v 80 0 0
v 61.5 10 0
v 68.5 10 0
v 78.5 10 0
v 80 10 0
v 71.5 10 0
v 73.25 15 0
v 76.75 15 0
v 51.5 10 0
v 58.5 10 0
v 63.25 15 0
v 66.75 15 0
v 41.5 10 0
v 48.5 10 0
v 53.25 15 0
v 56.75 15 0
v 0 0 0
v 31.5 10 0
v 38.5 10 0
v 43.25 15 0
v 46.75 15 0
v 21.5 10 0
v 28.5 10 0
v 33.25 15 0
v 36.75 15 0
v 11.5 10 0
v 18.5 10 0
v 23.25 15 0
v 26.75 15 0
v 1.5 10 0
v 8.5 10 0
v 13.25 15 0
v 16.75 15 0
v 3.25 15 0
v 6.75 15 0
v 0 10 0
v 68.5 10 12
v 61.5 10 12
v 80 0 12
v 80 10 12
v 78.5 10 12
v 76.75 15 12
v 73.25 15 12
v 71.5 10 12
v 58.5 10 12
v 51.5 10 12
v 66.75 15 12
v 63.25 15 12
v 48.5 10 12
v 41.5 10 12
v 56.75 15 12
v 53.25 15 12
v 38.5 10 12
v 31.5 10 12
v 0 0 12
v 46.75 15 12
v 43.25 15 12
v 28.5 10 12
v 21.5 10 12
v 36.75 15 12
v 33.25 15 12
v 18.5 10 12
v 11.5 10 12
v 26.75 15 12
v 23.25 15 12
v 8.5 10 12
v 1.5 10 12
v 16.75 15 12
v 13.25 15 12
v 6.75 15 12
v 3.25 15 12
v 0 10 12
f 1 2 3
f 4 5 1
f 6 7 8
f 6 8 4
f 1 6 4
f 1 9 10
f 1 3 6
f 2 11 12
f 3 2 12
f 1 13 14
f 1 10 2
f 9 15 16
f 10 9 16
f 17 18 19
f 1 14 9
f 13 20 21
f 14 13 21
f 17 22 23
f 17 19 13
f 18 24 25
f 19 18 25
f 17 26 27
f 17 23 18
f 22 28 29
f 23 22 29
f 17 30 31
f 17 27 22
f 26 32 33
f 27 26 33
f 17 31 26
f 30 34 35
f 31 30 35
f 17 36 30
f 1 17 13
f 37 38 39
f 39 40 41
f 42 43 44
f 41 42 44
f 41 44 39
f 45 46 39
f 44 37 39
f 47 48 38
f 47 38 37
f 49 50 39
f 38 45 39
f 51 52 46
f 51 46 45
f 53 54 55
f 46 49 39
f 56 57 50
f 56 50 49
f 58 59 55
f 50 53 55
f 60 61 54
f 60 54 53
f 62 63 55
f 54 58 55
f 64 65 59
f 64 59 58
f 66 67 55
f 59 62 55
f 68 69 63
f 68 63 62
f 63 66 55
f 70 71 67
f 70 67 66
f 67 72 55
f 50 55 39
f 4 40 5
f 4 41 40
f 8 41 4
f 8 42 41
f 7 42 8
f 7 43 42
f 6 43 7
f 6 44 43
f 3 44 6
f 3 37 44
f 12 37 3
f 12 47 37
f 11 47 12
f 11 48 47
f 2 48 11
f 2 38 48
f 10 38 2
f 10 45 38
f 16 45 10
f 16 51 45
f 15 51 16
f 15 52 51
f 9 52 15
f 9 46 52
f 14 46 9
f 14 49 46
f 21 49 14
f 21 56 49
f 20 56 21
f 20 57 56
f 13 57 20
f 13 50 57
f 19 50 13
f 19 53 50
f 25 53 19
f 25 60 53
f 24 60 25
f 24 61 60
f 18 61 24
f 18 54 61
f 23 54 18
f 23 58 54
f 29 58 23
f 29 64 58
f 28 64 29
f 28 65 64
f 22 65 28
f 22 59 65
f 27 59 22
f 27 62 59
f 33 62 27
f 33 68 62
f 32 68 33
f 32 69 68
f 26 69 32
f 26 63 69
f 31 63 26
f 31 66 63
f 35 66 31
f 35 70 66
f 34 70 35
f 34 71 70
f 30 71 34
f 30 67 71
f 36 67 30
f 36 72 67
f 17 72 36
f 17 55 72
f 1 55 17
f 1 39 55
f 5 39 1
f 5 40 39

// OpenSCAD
$fn = 32;

// ----------------------------------------------------------------------
// Gear rack: 8 teeth, pitch 10 mm
// ----------------------------------------------------------------------

// --- parameters (mm) ---
teeth = 8;                // number of teeth
pitch = 10;               // tooth pitch, X
root_w = 7;               // tooth width at the root
tip_w = 3.5;              // tooth width at the tip
base_h = 10;              // rack body height, Y
tooth_h = 5;              // tooth height above the body
plate_t = 12;             // rack width, Z (extrusion height)

rack_l = teeth * pitch;  // overall length
total_h = base_h + tooth_h;  // overall height

profile = [[0, 0], [80, 0], [80, 10], [78.5, 10], [76.75, 15], [73.25, 15], [71.5, 10], [68.5, 10], [66.75, 15], [63.25, 15], [61.5, 10], [58.5, 10], [56.75, 15], [53.25, 15], [51.5, 10], [48.5, 10], [46.75, 15], [43.25, 15], [41.5, 10], [38.5, 10], [36.75, 15], [33.25, 15], [31.5, 10], [28.5, 10], [26.75, 15], [23.25, 15], [21.5, 10], [18.5, 10], [16.75, 15], [13.25, 15], [11.5, 10], [8.5, 10], [6.75, 15], [3.25, 15], [1.5, 10], [0, 10]];  // primary outline, 36 points, counter clockwise

// --- the one profile operation ---
linear_extrude(height = plate_t) polygon(points = profile);
